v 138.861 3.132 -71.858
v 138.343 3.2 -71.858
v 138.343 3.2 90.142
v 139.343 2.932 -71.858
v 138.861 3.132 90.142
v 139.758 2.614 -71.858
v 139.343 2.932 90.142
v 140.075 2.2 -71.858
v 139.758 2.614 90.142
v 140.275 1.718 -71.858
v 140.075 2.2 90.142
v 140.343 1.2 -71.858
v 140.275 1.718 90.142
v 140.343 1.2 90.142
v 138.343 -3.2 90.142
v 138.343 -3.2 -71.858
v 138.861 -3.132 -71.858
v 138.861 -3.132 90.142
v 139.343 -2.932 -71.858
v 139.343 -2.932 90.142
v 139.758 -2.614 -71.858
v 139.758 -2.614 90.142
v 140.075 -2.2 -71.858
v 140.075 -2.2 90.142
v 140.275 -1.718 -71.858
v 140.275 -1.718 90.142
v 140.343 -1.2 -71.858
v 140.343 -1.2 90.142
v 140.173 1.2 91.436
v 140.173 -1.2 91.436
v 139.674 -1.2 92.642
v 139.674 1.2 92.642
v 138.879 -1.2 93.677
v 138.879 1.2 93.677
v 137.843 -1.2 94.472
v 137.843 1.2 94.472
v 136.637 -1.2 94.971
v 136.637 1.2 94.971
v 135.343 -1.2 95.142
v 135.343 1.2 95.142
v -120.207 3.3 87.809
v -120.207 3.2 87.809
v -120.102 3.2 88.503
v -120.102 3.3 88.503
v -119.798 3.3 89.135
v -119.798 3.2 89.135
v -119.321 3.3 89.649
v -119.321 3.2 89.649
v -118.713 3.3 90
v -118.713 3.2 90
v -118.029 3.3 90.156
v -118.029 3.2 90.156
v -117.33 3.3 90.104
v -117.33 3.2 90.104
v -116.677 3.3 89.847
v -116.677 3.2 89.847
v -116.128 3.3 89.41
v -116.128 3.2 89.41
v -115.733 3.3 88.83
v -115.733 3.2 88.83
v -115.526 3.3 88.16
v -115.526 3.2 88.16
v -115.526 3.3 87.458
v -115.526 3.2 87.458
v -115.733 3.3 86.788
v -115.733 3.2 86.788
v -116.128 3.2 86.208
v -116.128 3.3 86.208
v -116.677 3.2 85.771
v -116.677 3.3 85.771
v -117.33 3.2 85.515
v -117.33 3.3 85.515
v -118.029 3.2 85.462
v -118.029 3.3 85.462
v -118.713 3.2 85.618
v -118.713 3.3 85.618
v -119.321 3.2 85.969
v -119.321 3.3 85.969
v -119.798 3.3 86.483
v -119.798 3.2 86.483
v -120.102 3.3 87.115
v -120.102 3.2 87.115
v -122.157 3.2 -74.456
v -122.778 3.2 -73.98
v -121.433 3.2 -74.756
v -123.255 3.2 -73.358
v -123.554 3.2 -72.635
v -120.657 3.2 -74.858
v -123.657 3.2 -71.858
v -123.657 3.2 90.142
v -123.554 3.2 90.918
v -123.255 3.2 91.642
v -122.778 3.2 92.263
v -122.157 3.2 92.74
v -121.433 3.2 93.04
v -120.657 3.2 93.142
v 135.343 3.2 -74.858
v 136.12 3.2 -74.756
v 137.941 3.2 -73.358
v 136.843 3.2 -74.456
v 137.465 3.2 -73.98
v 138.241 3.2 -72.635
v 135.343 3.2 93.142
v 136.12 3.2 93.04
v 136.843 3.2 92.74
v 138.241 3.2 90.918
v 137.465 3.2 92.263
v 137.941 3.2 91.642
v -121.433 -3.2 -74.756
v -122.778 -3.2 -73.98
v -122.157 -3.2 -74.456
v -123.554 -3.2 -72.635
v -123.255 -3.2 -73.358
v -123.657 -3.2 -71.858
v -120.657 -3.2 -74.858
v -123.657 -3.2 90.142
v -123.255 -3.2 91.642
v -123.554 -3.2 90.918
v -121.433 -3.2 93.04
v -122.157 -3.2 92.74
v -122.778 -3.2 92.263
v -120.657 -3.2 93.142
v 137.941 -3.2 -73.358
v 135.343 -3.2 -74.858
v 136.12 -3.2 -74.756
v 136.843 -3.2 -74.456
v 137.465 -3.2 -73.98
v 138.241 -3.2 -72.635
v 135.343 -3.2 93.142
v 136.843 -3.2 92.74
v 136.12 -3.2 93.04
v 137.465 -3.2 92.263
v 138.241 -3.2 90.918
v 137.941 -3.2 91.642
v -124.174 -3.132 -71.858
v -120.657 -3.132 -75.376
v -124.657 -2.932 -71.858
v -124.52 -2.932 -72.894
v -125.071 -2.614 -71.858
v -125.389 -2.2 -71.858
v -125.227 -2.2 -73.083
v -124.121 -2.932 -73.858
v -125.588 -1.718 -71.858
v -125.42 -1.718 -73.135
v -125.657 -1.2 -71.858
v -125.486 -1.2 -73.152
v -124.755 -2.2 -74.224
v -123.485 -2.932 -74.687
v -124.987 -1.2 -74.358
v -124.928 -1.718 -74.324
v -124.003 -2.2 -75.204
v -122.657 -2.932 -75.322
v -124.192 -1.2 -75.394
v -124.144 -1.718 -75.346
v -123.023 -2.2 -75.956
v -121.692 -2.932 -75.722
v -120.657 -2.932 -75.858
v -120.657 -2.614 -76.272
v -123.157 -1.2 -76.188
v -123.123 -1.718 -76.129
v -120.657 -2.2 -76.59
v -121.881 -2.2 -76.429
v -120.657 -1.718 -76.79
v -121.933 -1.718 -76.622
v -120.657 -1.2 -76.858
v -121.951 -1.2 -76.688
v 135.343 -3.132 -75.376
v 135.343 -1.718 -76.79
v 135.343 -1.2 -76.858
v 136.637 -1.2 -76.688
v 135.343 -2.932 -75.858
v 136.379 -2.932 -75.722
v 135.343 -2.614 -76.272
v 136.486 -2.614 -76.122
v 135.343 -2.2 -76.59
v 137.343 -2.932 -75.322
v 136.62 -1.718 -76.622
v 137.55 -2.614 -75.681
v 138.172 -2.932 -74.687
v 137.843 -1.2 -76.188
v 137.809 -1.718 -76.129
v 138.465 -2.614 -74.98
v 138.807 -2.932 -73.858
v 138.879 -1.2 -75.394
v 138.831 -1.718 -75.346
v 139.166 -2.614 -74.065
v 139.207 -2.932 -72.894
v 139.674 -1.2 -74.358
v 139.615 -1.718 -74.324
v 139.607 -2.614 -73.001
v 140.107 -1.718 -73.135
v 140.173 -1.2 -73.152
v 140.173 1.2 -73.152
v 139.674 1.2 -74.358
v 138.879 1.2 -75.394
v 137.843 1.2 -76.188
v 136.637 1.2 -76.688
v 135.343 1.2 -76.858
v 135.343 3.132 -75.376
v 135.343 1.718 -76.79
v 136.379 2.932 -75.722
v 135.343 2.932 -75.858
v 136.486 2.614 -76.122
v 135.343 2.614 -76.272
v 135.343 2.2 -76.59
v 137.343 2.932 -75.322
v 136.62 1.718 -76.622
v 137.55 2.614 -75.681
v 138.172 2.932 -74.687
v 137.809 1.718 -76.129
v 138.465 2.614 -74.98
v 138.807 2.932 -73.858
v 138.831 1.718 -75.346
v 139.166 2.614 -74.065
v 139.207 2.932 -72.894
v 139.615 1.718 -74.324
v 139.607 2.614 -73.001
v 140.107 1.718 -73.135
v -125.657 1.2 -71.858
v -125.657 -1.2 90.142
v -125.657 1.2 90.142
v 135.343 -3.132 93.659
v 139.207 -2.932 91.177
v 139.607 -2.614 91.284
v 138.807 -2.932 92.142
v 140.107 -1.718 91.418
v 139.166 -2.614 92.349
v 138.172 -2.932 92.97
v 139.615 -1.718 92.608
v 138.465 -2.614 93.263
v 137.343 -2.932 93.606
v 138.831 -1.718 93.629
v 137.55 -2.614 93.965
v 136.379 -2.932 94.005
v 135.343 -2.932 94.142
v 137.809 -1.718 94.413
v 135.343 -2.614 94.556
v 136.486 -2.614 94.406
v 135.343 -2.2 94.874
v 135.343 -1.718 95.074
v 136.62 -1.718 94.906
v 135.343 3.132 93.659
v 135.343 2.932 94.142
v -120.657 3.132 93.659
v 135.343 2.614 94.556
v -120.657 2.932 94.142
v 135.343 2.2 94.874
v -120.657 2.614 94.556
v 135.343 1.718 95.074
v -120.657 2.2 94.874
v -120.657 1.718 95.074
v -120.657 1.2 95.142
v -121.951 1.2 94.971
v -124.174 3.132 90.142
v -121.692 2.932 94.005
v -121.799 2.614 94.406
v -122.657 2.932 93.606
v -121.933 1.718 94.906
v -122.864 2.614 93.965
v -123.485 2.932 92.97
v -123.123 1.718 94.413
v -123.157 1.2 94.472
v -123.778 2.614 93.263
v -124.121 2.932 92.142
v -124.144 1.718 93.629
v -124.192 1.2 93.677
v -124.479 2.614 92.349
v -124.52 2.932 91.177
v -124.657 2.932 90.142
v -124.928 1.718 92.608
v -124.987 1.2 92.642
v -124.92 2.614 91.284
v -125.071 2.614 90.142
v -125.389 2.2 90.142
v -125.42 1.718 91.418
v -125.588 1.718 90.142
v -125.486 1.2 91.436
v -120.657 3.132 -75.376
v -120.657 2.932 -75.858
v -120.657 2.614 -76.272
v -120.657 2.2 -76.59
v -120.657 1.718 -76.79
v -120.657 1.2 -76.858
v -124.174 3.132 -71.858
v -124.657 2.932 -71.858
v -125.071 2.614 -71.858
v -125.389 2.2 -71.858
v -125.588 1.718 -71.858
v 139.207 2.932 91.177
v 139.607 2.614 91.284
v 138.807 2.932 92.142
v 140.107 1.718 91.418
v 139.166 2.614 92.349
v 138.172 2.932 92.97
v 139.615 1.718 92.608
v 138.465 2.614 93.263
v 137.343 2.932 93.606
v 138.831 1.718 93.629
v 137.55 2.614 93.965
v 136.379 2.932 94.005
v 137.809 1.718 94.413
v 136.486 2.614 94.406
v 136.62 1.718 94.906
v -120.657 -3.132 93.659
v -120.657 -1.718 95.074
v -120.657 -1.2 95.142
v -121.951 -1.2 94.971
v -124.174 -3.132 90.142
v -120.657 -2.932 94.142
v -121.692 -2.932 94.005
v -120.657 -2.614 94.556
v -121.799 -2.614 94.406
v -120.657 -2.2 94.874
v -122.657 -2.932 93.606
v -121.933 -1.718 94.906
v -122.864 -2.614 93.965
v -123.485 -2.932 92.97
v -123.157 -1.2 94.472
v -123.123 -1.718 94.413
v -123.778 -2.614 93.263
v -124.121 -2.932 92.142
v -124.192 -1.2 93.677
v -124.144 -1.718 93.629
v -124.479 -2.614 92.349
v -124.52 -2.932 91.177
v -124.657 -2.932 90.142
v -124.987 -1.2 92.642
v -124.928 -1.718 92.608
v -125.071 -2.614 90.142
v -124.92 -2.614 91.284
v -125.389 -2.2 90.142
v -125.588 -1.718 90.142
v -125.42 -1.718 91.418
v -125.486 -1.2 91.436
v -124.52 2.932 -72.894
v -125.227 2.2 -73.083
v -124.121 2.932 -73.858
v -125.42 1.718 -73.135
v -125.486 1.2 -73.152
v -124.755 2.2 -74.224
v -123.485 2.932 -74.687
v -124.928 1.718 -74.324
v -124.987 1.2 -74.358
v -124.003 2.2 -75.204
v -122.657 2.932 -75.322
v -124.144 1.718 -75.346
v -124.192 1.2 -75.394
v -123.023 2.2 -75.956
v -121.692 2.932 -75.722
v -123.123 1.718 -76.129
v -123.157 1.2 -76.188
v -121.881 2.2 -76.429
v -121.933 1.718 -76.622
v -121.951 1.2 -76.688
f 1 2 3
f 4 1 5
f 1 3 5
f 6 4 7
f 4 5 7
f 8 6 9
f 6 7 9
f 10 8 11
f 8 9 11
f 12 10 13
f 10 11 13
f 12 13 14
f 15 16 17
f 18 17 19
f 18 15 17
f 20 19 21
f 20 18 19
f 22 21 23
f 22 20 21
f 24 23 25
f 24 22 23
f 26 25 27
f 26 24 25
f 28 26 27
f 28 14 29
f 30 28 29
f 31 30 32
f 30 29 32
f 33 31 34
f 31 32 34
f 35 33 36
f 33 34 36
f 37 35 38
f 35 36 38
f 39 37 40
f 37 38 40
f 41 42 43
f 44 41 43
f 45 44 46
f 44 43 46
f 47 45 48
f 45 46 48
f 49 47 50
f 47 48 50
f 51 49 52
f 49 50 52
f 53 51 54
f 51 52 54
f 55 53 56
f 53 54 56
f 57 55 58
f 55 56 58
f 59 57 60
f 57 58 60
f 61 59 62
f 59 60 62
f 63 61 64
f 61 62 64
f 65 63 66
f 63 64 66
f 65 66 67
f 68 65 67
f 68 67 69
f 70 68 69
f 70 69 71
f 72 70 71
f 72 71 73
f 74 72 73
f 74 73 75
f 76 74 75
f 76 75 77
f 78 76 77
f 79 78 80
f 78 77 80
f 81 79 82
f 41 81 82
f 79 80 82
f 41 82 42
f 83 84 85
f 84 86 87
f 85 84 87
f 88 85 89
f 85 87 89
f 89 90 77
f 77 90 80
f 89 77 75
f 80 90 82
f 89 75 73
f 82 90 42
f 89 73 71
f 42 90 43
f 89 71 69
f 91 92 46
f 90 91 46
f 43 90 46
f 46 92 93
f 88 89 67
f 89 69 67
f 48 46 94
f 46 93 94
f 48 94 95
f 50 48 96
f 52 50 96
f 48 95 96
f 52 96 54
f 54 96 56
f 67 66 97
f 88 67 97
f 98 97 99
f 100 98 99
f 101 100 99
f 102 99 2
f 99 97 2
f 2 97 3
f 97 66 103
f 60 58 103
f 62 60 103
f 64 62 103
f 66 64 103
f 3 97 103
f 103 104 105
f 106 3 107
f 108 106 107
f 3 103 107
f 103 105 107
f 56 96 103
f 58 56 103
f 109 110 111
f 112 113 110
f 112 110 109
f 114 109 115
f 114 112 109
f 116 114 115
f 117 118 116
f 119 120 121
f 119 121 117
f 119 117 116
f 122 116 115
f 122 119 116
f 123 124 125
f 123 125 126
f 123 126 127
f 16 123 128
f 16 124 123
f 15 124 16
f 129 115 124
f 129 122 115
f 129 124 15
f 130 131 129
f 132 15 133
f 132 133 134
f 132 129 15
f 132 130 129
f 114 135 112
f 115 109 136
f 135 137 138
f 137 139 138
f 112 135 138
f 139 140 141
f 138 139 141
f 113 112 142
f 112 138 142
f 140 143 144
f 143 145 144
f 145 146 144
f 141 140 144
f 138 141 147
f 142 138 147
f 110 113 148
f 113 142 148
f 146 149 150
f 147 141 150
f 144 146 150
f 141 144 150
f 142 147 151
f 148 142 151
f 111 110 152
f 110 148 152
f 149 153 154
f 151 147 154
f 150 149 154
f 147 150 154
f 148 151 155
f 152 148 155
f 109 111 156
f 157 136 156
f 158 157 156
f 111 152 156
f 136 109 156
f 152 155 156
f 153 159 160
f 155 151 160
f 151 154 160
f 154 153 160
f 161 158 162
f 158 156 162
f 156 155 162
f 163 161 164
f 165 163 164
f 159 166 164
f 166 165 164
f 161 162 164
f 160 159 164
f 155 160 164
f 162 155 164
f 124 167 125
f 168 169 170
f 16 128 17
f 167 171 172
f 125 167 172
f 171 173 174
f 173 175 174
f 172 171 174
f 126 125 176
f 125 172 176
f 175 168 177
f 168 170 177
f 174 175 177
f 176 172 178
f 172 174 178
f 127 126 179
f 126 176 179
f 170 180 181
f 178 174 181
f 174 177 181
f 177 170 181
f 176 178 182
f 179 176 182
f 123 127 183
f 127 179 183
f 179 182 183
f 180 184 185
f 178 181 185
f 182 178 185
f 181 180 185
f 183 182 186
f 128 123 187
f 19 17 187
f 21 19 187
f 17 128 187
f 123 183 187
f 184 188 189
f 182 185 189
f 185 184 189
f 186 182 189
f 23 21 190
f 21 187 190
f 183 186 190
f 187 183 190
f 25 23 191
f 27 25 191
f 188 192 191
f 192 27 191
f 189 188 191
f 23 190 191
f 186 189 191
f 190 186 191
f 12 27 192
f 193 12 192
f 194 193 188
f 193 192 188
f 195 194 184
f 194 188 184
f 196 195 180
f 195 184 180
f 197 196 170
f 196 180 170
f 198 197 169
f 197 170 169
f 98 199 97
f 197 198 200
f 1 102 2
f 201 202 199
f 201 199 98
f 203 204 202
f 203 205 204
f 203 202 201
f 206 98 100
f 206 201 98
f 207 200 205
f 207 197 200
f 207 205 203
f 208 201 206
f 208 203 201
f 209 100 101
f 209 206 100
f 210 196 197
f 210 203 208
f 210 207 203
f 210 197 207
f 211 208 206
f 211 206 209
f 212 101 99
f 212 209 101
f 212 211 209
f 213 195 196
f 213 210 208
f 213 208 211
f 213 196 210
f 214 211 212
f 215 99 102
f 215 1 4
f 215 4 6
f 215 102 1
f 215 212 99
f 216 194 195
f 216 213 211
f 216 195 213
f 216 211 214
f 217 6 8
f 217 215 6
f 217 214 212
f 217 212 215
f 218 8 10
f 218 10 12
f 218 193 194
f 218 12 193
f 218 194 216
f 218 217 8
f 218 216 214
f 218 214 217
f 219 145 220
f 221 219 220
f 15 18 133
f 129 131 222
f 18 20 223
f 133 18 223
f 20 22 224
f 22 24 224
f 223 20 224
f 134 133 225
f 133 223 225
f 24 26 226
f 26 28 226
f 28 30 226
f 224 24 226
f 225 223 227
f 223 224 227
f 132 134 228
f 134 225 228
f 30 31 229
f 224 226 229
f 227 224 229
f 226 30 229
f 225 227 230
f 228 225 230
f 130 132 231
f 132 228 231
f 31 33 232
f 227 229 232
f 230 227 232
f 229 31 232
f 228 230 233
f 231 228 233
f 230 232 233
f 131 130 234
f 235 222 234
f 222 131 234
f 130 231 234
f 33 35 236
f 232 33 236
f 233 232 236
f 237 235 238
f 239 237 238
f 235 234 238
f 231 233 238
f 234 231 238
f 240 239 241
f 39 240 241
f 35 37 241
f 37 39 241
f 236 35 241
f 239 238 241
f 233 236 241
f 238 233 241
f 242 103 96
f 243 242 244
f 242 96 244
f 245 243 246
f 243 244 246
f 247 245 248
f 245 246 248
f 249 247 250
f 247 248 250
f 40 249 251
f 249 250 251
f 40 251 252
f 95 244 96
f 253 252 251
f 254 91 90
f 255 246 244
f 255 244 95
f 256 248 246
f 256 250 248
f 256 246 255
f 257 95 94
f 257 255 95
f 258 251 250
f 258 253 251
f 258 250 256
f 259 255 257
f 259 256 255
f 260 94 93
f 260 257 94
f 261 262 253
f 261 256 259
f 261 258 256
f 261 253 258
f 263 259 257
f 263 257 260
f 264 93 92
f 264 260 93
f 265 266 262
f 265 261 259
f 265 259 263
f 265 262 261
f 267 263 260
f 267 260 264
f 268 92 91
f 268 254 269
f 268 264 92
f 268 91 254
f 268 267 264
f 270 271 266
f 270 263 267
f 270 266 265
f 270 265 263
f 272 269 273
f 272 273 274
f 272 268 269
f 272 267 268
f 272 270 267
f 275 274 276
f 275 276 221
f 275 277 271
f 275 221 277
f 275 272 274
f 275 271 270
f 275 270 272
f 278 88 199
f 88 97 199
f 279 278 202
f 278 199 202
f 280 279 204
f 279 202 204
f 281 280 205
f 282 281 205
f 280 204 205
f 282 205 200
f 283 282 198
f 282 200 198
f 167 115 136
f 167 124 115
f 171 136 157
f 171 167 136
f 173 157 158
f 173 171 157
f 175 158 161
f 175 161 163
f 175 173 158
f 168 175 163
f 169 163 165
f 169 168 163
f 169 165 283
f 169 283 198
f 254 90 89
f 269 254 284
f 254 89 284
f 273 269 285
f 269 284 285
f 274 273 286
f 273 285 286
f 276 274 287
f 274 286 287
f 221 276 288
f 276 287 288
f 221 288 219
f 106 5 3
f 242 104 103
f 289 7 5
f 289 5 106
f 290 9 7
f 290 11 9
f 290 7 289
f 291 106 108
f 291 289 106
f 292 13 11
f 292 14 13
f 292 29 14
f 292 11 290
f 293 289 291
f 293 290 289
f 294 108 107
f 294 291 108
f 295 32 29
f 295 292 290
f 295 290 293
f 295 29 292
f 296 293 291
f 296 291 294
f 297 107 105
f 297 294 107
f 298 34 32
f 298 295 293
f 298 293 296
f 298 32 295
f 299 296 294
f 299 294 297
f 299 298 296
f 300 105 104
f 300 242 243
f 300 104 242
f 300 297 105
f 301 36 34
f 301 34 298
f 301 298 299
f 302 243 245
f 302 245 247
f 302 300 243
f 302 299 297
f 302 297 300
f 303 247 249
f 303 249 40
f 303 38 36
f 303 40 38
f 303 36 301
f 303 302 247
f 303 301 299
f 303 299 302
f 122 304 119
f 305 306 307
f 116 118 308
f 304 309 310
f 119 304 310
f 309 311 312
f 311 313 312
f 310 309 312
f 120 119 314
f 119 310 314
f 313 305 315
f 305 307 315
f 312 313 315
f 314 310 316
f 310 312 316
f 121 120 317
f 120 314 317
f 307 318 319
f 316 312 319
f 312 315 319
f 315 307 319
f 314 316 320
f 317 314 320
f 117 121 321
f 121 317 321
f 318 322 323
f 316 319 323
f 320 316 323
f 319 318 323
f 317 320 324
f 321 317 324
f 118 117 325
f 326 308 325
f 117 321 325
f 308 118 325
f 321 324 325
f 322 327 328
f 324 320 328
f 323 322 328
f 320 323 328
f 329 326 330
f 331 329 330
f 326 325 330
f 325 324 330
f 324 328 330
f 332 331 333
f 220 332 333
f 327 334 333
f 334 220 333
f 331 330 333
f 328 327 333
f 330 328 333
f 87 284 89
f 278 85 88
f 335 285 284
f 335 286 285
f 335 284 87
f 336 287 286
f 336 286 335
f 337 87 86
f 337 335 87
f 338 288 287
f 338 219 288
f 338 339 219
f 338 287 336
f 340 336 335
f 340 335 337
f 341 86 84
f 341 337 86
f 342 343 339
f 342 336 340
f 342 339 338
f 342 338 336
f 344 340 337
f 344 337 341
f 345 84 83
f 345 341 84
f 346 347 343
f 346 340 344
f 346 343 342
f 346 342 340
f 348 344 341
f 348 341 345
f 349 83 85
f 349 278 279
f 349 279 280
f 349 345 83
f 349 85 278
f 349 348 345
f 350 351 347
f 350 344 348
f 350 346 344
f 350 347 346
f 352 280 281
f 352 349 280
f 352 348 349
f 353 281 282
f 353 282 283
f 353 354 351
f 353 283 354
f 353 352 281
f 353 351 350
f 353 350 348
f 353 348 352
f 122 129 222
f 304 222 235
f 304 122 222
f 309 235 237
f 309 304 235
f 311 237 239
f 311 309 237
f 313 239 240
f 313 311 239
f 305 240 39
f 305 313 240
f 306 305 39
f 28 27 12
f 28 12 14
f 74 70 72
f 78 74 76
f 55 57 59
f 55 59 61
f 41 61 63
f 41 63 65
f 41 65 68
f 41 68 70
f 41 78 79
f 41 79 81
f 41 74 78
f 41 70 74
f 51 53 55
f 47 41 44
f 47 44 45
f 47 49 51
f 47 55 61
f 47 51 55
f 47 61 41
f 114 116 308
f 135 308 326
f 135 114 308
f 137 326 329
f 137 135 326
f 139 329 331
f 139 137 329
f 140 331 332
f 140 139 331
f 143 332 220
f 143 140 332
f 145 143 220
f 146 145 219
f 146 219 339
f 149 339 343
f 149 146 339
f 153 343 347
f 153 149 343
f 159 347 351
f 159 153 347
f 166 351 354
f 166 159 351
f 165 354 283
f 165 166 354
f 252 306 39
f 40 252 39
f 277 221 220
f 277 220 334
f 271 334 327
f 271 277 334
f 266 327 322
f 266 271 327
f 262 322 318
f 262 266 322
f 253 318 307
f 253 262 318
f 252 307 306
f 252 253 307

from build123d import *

# Parameters (mm, degrees)
F0_W     = 266
F0_H     = 172
F1_DEPTH = 3.2
F2_R     = 5
F3_R     = 2
F4_R     = 2.3534685549
F5_DEPTH = 0.1


with BuildPart() as f1:
    # F0 (on Front) → F1 (new body, symmetric)
    with BuildSketch(Plane.XZ):
        with Locations((7.3433928192, 9.1417450992)):
            Rectangle(F0_W, F0_H)
    extrude(amount=F1_DEPTH, both=True)

    # F2
    f2_edges = [f1.edges().sort_by_distance(p)[0] for p in [
        (-125.656607, 0, 95.141745),
        (140.343393, 0, 95.141745),
        (140.343393, 0, -76.858255),
        (-125.656607, 0, -76.858255),
    ]]
    fillet(f2_edges, radius=F2_R)

    # F3
    f3_edges = [f1.edges().sort_by_distance(p)[0] for p in [
        (7.343393, 3.2, -76.858255),
        (7.343393, -3.2, -76.858255),
        (-125.656607, 3.2, 9.141745),
        (-125.656607, -3.2, 9.141745),
        (7.343393, 3.2, 95.141745),
        (140.343393, 3.2, 9.141745),
        (140.343393, -3.2, 9.141745),
        (7.343393, -3.2, 95.141745),
        (-124.192141, -3.2, -75.393789),
        (-124.192141, 3.2, -75.393789),
        (-124.192141, -3.2, 93.677279),
        (-124.192141, 3.2, 93.677279),
        (138.878927, -3.2, 93.677279),
        (138.878927, 3.2, -75.393789),
        (138.878927, -3.2, -75.393789),
        (138.878927, 3.2, 93.677279),
    ]]
    fillet(f3_edges, radius=F3_R)

    # F4 (on face) → F5 (join)
    with BuildSketch(Plane(origin=(0, 3.2, 0), x_dir=(-1, 0, 0), z_dir=(0, 1, 0))):
        with Locations((117.853499949, 87.8090560436)):
            Circle(F4_R)
    extrude(amount=F5_DEPTH)


solid = f1.part
